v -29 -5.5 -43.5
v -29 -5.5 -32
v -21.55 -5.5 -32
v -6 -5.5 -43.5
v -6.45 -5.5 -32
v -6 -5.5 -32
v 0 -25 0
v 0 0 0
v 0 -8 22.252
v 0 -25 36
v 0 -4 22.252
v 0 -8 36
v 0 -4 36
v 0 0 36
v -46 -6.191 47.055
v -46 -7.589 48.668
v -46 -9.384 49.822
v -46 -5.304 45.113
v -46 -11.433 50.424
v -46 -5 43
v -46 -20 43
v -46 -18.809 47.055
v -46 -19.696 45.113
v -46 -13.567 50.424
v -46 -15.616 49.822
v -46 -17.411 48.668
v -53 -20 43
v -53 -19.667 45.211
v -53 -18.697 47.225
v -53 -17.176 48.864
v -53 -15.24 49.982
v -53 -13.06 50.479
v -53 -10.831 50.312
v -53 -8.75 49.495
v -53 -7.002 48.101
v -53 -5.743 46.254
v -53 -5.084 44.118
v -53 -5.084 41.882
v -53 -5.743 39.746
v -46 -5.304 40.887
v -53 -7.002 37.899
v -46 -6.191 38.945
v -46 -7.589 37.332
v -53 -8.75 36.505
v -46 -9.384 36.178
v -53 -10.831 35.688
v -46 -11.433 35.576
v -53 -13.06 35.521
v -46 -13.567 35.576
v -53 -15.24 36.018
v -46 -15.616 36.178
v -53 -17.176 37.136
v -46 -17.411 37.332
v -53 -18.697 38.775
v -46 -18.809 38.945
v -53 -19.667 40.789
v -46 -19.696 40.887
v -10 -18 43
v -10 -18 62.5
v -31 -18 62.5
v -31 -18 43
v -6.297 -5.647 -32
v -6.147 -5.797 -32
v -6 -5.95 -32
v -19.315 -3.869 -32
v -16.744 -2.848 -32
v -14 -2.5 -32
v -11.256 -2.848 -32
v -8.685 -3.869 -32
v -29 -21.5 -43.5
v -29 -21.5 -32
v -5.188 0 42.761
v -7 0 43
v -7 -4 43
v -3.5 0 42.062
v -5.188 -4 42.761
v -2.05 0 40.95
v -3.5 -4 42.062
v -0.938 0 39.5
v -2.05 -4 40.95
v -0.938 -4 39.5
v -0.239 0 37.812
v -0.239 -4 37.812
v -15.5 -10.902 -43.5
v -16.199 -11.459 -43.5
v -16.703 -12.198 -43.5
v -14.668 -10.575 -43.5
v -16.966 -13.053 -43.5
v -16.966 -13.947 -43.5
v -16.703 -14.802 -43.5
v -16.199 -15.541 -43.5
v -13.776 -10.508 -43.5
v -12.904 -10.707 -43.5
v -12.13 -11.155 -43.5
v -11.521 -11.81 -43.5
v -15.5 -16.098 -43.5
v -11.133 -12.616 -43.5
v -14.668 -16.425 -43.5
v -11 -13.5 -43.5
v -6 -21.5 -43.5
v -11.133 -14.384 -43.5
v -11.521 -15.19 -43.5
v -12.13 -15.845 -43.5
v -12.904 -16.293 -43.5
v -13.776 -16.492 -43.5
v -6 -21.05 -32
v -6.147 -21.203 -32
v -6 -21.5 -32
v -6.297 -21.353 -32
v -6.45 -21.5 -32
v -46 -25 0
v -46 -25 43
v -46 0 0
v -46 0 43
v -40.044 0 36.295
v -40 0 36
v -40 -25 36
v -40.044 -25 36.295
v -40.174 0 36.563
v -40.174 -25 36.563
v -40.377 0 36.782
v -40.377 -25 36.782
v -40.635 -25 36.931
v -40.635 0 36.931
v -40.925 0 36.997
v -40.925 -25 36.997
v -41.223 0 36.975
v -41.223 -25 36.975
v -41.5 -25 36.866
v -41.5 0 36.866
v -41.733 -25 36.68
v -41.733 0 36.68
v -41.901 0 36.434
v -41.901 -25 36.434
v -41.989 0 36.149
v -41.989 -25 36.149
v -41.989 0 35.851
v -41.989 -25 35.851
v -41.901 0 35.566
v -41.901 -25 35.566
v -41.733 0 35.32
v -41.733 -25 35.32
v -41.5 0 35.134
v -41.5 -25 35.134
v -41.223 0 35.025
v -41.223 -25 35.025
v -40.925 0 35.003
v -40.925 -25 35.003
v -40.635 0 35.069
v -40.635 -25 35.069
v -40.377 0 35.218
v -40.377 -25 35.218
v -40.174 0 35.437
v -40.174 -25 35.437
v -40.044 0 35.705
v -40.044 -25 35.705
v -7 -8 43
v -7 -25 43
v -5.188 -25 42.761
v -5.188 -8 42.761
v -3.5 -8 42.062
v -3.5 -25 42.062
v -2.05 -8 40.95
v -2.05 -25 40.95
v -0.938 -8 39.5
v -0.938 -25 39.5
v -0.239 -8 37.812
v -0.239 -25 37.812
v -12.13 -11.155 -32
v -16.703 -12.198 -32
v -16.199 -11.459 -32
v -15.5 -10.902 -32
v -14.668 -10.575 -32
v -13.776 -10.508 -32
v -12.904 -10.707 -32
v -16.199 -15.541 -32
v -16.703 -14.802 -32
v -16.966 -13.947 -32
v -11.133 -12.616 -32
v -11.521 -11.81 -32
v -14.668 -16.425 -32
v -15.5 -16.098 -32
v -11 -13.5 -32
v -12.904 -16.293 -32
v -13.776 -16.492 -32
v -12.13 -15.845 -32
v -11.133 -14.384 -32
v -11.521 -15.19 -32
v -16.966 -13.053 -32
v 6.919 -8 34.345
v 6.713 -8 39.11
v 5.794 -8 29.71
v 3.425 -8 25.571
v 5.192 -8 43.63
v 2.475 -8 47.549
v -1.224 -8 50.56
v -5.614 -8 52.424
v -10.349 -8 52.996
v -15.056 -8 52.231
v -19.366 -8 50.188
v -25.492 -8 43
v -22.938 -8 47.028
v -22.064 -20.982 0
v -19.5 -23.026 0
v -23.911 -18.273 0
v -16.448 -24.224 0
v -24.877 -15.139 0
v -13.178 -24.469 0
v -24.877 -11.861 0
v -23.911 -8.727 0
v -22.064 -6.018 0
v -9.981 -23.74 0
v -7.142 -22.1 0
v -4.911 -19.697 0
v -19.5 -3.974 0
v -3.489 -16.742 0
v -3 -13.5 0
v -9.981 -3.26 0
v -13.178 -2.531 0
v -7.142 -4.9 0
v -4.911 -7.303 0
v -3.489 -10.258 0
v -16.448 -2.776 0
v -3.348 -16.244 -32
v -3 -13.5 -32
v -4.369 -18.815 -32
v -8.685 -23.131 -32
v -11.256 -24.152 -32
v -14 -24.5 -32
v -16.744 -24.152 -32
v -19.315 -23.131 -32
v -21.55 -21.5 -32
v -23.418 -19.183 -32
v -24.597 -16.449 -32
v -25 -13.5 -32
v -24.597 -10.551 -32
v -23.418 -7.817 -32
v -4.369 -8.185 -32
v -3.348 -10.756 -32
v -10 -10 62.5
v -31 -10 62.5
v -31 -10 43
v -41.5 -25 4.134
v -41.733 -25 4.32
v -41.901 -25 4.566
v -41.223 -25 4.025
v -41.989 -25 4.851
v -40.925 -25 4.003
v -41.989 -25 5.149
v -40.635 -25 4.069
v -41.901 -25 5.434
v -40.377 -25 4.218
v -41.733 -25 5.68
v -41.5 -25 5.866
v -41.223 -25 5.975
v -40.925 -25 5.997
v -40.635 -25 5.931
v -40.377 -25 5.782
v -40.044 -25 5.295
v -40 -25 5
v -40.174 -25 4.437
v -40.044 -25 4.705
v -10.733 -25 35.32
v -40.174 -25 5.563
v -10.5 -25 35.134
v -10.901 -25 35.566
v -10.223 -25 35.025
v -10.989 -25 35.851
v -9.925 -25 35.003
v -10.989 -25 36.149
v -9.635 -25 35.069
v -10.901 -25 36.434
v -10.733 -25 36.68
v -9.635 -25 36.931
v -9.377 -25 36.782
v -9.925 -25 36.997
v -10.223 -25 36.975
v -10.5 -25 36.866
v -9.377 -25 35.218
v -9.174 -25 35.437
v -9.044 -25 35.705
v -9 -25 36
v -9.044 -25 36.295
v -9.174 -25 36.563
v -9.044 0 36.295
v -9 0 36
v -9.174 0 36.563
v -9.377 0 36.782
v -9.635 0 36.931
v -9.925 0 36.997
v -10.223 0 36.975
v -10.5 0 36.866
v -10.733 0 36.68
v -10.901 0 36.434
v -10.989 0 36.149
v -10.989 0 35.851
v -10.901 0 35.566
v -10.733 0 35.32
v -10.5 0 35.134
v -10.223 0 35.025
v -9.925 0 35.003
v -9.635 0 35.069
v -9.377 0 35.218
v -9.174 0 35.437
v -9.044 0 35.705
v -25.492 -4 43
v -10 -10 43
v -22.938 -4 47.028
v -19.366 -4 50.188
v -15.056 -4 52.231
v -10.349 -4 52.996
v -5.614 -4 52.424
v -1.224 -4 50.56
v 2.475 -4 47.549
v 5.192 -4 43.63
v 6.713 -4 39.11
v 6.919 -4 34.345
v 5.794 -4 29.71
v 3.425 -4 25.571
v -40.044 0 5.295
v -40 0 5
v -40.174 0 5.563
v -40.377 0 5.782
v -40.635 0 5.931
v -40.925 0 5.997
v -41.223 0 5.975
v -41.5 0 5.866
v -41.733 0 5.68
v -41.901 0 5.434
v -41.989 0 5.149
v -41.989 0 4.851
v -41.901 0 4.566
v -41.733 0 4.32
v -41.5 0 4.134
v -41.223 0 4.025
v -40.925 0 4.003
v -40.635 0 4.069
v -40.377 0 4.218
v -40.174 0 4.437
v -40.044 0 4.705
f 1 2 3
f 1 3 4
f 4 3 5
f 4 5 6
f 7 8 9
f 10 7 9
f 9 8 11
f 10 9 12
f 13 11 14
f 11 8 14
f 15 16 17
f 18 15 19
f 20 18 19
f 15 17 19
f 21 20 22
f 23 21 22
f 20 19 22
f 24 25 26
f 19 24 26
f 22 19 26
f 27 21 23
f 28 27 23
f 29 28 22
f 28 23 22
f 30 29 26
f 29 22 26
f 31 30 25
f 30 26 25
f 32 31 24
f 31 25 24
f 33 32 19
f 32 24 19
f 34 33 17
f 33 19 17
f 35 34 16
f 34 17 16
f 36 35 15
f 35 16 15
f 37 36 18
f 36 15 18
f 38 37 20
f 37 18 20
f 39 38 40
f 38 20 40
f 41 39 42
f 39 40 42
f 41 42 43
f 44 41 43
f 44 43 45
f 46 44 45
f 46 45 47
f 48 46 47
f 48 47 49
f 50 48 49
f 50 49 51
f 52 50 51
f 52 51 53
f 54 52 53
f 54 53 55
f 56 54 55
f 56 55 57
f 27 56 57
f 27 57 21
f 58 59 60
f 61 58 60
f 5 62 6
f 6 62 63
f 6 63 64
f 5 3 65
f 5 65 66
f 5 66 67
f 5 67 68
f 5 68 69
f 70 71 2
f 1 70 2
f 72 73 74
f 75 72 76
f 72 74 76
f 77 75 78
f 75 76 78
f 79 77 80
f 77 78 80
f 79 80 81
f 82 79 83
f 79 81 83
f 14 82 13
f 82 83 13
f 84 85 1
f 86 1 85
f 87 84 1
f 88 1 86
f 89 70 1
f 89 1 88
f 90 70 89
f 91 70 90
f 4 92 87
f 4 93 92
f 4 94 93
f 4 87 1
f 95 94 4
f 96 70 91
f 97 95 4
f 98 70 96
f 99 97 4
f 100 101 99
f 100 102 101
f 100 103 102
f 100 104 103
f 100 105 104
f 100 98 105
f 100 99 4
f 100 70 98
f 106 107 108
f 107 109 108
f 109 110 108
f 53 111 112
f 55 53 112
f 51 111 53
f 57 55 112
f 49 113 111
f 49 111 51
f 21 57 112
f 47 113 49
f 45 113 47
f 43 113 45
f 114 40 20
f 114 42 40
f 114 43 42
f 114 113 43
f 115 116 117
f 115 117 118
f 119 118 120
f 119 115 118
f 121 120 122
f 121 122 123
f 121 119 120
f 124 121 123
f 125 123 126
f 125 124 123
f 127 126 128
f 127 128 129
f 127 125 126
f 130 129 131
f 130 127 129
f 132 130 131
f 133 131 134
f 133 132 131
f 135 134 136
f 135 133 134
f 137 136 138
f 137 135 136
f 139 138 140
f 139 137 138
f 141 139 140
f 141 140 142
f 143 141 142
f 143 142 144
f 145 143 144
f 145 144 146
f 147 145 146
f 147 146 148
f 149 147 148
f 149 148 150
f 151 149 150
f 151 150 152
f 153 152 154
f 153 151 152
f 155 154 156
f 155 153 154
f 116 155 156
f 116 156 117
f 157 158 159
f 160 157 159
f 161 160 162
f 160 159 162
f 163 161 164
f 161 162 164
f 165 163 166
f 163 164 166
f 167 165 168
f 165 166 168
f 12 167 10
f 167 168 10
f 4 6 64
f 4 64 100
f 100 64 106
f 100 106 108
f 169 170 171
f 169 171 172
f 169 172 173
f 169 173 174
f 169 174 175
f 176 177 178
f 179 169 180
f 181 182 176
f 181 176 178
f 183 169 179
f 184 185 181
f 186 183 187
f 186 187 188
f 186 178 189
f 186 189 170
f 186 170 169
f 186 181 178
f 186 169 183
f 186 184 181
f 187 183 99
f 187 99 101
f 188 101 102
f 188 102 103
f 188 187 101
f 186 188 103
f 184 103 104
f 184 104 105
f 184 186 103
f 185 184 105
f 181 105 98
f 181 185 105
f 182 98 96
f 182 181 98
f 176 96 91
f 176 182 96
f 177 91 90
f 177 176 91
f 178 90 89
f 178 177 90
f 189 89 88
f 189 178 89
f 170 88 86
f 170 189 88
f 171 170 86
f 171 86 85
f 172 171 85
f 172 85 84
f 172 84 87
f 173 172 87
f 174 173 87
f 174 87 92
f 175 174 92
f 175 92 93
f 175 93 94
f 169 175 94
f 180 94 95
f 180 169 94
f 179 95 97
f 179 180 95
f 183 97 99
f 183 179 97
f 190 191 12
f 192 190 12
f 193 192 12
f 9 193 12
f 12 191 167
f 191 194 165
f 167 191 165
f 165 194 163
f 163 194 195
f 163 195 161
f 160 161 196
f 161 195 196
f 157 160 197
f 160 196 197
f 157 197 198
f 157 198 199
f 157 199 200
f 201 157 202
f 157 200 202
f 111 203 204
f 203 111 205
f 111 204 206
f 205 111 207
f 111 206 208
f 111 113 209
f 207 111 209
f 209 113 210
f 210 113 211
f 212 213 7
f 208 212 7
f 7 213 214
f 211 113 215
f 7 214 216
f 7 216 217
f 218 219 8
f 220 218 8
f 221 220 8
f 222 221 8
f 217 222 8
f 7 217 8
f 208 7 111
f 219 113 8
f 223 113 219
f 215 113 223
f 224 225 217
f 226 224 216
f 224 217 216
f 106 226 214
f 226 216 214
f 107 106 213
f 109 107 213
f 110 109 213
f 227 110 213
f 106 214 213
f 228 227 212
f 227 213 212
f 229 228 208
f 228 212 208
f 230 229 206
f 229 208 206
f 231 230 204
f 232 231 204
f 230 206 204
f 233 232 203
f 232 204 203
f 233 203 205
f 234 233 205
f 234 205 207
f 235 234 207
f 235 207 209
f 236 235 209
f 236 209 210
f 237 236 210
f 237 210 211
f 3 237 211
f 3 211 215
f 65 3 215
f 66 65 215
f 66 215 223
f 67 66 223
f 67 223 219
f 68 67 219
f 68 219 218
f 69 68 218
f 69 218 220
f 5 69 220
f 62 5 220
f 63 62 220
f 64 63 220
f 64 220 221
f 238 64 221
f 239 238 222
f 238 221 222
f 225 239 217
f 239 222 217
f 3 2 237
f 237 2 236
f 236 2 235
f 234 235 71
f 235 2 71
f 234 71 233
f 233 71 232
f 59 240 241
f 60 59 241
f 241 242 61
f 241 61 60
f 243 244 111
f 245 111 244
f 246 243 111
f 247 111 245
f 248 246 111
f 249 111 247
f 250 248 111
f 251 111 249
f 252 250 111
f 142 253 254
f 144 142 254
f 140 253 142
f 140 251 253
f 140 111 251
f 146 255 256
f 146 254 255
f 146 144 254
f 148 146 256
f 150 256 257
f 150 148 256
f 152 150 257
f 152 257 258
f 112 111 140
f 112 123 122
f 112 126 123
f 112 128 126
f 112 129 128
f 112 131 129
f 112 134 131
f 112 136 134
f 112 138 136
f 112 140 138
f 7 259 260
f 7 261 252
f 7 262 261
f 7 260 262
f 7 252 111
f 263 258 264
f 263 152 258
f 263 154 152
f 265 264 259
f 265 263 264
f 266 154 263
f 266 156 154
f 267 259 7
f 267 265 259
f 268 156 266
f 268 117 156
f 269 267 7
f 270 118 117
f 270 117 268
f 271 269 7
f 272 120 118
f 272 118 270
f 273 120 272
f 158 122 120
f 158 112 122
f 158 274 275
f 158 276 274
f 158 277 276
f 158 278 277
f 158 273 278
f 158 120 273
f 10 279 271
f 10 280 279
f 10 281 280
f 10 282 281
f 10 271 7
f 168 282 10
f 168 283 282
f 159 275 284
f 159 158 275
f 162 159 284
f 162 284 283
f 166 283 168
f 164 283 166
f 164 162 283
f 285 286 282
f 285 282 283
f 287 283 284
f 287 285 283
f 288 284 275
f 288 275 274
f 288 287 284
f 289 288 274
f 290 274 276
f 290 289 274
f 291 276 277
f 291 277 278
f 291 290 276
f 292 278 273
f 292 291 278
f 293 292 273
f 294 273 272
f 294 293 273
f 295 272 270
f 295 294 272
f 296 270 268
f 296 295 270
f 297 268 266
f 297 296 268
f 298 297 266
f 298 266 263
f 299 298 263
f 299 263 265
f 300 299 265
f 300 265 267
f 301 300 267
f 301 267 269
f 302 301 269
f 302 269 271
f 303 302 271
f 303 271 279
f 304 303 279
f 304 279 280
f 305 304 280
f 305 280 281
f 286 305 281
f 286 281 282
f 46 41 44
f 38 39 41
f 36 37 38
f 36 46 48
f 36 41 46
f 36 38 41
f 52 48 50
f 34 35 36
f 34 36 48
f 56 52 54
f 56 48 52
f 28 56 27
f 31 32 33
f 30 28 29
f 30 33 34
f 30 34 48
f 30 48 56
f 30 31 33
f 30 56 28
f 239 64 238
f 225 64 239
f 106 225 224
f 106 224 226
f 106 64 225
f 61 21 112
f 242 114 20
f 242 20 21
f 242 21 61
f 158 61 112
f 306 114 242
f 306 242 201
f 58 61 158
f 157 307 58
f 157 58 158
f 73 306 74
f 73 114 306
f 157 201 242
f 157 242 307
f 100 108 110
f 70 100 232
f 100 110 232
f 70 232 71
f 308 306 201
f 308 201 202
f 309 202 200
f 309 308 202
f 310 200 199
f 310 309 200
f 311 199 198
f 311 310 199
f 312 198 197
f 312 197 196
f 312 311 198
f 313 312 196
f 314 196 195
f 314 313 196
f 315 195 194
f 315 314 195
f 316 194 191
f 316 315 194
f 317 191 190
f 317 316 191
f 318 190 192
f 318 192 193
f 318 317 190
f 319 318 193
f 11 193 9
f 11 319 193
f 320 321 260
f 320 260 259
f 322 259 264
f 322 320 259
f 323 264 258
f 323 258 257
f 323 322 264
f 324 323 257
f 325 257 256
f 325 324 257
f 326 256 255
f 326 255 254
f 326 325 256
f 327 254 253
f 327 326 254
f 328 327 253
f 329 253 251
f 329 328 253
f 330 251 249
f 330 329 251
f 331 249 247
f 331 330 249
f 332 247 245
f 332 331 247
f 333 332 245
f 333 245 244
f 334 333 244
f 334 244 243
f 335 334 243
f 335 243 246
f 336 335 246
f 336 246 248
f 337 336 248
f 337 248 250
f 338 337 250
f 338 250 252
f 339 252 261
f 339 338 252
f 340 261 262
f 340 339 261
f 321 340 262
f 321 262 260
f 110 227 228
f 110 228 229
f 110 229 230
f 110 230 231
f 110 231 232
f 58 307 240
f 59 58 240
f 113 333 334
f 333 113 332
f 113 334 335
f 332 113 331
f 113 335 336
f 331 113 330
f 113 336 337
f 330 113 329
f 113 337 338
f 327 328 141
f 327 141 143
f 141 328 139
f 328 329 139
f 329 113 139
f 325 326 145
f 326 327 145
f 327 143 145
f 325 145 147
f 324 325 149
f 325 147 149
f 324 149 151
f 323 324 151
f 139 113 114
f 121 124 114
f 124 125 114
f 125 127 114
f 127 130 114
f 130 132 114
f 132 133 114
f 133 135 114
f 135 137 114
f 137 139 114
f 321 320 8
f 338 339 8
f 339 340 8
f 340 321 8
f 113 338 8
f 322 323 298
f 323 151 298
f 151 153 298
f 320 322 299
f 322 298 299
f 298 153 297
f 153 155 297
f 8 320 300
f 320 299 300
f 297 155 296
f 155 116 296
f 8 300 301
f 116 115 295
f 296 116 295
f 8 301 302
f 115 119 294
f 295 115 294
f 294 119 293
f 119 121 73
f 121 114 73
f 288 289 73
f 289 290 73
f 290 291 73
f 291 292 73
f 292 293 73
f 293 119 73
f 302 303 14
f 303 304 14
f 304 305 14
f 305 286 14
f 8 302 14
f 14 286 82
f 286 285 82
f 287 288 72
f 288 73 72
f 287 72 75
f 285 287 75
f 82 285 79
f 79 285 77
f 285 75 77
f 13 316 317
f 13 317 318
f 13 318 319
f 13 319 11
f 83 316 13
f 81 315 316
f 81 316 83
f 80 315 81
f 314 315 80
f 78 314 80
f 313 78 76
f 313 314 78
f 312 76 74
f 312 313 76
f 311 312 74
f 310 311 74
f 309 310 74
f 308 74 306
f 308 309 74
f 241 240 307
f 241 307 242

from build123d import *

# Parameters (mm, degrees)
F0_W      = 46
F0_H      = 43
F0_R      = 1
F1_DEPTH  = 25
F4_R      = 7
F3_R      = 17
F3_R_2    = 1
F5_DEPTH  = 4
F7_W      = 21
F7_H      = 19.5
F8_DEPTH  = 8
F10_DEPTH = 7
F11_R     = 11
F12_DEPTH = 32
F13_R     = 3
F14_DEPTH = 11.5


with BuildPart() as f1:
    # F0 (on Front) → F1 (new body)
    with BuildSketch(Plane.XZ):
        with Locations((-23, 21.5)):
            Rectangle(F0_W, F0_H)
        with Locations((-41, 5)):
            Circle(F0_R, mode=Mode.SUBTRACT)
        with Locations((-41, 36)):
            Circle(F0_R, mode=Mode.SUBTRACT)
        with Locations((-10, 36)):
            Circle(F0_R, mode=Mode.SUBTRACT)
    extrude(amount=F1_DEPTH)

    # F4
    f4_edges = [f1.edges().sort_by_distance(p)[0] for p in [
        (0, -12.5, 43),
    ]]
    fillet(f4_edges, radius=F4_R)

    # F3 (on offset) → F5 (join)
    with BuildSketch(Plane(origin=(0, -4, 0), x_dir=(-1, 0, 0), z_dir=(0, 1, 0))):
        with Locations((10, 36)):
            Circle(F3_R)
        with Locations((10, 36)):
            Circle(F3_R_2, mode=Mode.SUBTRACT)
    extrude(amount=-F5_DEPTH)

    # F7 (on offset) → F8 (join)
    with BuildSketch(Plane(origin=(0, -10, 0), x_dir=(-1, 0, 0), z_dir=(0, 1, 0))):
        with Locations((20.5, 52.75)):
            Rectangle(F7_W, F7_H)
    extrude(amount=-F8_DEPTH)

    # F9 (on face) → F10 (join)
    with BuildSketch(Plane(origin=(-46, 0, 0), x_dir=(0, -1, 0), z_dir=(-1, 0, 0))):
        with BuildLine():
            Line((20, 43), (5, 43))
            ThreePointArc((5, 43), (12.5, 35.5), (20, 43))
        make_face()
        with BuildLine():
            ThreePointArc((20, 43), (12.5, 50.5), (5, 43))
            Line((5, 43), (20, 43))
        make_face()
    extrude(amount=F10_DEPTH)

    # F11 (on face) → F12 (join)
    with BuildSketch(Plane(origin=(0, 0, 0), x_dir=(1, 0, 0), z_dir=(0, 0, -1))):
        with Locations((-14, 13.5)):
            Circle(F11_R)
    extrude(amount=F12_DEPTH)

    # F13 (on face) → F14 (join)
    with BuildSketch(Plane(origin=(0, 0, -32), x_dir=(1, 0, 0), z_dir=(0, 0, -1))):
        with BuildLine():
            ThreePointArc((-21.5498344353, 5.5), (-25, 13.5), (-21.5498344353, 21.5))
            Line((-21.5498344353, 21.5), (-29, 21.5))
            Line((-29, 21.5), (-29, 5.5))
            Line((-29, 5.5), (-21.5498344353, 5.5))
        make_face()
        with BuildLine():
            Line((-6, 5.9501655647), (-6, 21.0498344353))
            ThreePointArc((-6, 21.0498344353), (-6.2218254069, 21.2781745931), (-6.4501655647, 21.5))
            Line((-6.4501655647, 21.5), (-21.5498344353, 21.5))
            ThreePointArc((-21.5498344353, 21.5), (-25, 13.5), (-21.5498344353, 5.5))
            Line((-21.5498344353, 5.5), (-6.4501655647, 5.5))
            ThreePointArc((-6.4501655647, 5.5), (-6.2218254069, 5.7218254069), (-6, 5.9501655647))
        make_face()
        with Locations((-14, 13.5)):
            Circle(F13_R, mode=Mode.SUBTRACT)
        with BuildLine():
            Line((-6, 5.5), (-6, 5.9501655647))
            ThreePointArc((-6, 5.9501655647), (-6.2218254069, 5.7218254069), (-6.4501655647, 5.5))
            Line((-6.4501655647, 5.5), (-6, 5.5))
        make_face()
        with BuildLine():
            ThreePointArc((-6.4501655647, 21.5), (-6.2218254069, 21.2781745931), (-6, 21.0498344353))
            Line((-6, 21.0498344353), (-6, 21.5))
            Line((-6, 21.5), (-6.4501655647, 21.5))
        make_face()
    extrude(amount=F14_DEPTH)


solid = f1.part
